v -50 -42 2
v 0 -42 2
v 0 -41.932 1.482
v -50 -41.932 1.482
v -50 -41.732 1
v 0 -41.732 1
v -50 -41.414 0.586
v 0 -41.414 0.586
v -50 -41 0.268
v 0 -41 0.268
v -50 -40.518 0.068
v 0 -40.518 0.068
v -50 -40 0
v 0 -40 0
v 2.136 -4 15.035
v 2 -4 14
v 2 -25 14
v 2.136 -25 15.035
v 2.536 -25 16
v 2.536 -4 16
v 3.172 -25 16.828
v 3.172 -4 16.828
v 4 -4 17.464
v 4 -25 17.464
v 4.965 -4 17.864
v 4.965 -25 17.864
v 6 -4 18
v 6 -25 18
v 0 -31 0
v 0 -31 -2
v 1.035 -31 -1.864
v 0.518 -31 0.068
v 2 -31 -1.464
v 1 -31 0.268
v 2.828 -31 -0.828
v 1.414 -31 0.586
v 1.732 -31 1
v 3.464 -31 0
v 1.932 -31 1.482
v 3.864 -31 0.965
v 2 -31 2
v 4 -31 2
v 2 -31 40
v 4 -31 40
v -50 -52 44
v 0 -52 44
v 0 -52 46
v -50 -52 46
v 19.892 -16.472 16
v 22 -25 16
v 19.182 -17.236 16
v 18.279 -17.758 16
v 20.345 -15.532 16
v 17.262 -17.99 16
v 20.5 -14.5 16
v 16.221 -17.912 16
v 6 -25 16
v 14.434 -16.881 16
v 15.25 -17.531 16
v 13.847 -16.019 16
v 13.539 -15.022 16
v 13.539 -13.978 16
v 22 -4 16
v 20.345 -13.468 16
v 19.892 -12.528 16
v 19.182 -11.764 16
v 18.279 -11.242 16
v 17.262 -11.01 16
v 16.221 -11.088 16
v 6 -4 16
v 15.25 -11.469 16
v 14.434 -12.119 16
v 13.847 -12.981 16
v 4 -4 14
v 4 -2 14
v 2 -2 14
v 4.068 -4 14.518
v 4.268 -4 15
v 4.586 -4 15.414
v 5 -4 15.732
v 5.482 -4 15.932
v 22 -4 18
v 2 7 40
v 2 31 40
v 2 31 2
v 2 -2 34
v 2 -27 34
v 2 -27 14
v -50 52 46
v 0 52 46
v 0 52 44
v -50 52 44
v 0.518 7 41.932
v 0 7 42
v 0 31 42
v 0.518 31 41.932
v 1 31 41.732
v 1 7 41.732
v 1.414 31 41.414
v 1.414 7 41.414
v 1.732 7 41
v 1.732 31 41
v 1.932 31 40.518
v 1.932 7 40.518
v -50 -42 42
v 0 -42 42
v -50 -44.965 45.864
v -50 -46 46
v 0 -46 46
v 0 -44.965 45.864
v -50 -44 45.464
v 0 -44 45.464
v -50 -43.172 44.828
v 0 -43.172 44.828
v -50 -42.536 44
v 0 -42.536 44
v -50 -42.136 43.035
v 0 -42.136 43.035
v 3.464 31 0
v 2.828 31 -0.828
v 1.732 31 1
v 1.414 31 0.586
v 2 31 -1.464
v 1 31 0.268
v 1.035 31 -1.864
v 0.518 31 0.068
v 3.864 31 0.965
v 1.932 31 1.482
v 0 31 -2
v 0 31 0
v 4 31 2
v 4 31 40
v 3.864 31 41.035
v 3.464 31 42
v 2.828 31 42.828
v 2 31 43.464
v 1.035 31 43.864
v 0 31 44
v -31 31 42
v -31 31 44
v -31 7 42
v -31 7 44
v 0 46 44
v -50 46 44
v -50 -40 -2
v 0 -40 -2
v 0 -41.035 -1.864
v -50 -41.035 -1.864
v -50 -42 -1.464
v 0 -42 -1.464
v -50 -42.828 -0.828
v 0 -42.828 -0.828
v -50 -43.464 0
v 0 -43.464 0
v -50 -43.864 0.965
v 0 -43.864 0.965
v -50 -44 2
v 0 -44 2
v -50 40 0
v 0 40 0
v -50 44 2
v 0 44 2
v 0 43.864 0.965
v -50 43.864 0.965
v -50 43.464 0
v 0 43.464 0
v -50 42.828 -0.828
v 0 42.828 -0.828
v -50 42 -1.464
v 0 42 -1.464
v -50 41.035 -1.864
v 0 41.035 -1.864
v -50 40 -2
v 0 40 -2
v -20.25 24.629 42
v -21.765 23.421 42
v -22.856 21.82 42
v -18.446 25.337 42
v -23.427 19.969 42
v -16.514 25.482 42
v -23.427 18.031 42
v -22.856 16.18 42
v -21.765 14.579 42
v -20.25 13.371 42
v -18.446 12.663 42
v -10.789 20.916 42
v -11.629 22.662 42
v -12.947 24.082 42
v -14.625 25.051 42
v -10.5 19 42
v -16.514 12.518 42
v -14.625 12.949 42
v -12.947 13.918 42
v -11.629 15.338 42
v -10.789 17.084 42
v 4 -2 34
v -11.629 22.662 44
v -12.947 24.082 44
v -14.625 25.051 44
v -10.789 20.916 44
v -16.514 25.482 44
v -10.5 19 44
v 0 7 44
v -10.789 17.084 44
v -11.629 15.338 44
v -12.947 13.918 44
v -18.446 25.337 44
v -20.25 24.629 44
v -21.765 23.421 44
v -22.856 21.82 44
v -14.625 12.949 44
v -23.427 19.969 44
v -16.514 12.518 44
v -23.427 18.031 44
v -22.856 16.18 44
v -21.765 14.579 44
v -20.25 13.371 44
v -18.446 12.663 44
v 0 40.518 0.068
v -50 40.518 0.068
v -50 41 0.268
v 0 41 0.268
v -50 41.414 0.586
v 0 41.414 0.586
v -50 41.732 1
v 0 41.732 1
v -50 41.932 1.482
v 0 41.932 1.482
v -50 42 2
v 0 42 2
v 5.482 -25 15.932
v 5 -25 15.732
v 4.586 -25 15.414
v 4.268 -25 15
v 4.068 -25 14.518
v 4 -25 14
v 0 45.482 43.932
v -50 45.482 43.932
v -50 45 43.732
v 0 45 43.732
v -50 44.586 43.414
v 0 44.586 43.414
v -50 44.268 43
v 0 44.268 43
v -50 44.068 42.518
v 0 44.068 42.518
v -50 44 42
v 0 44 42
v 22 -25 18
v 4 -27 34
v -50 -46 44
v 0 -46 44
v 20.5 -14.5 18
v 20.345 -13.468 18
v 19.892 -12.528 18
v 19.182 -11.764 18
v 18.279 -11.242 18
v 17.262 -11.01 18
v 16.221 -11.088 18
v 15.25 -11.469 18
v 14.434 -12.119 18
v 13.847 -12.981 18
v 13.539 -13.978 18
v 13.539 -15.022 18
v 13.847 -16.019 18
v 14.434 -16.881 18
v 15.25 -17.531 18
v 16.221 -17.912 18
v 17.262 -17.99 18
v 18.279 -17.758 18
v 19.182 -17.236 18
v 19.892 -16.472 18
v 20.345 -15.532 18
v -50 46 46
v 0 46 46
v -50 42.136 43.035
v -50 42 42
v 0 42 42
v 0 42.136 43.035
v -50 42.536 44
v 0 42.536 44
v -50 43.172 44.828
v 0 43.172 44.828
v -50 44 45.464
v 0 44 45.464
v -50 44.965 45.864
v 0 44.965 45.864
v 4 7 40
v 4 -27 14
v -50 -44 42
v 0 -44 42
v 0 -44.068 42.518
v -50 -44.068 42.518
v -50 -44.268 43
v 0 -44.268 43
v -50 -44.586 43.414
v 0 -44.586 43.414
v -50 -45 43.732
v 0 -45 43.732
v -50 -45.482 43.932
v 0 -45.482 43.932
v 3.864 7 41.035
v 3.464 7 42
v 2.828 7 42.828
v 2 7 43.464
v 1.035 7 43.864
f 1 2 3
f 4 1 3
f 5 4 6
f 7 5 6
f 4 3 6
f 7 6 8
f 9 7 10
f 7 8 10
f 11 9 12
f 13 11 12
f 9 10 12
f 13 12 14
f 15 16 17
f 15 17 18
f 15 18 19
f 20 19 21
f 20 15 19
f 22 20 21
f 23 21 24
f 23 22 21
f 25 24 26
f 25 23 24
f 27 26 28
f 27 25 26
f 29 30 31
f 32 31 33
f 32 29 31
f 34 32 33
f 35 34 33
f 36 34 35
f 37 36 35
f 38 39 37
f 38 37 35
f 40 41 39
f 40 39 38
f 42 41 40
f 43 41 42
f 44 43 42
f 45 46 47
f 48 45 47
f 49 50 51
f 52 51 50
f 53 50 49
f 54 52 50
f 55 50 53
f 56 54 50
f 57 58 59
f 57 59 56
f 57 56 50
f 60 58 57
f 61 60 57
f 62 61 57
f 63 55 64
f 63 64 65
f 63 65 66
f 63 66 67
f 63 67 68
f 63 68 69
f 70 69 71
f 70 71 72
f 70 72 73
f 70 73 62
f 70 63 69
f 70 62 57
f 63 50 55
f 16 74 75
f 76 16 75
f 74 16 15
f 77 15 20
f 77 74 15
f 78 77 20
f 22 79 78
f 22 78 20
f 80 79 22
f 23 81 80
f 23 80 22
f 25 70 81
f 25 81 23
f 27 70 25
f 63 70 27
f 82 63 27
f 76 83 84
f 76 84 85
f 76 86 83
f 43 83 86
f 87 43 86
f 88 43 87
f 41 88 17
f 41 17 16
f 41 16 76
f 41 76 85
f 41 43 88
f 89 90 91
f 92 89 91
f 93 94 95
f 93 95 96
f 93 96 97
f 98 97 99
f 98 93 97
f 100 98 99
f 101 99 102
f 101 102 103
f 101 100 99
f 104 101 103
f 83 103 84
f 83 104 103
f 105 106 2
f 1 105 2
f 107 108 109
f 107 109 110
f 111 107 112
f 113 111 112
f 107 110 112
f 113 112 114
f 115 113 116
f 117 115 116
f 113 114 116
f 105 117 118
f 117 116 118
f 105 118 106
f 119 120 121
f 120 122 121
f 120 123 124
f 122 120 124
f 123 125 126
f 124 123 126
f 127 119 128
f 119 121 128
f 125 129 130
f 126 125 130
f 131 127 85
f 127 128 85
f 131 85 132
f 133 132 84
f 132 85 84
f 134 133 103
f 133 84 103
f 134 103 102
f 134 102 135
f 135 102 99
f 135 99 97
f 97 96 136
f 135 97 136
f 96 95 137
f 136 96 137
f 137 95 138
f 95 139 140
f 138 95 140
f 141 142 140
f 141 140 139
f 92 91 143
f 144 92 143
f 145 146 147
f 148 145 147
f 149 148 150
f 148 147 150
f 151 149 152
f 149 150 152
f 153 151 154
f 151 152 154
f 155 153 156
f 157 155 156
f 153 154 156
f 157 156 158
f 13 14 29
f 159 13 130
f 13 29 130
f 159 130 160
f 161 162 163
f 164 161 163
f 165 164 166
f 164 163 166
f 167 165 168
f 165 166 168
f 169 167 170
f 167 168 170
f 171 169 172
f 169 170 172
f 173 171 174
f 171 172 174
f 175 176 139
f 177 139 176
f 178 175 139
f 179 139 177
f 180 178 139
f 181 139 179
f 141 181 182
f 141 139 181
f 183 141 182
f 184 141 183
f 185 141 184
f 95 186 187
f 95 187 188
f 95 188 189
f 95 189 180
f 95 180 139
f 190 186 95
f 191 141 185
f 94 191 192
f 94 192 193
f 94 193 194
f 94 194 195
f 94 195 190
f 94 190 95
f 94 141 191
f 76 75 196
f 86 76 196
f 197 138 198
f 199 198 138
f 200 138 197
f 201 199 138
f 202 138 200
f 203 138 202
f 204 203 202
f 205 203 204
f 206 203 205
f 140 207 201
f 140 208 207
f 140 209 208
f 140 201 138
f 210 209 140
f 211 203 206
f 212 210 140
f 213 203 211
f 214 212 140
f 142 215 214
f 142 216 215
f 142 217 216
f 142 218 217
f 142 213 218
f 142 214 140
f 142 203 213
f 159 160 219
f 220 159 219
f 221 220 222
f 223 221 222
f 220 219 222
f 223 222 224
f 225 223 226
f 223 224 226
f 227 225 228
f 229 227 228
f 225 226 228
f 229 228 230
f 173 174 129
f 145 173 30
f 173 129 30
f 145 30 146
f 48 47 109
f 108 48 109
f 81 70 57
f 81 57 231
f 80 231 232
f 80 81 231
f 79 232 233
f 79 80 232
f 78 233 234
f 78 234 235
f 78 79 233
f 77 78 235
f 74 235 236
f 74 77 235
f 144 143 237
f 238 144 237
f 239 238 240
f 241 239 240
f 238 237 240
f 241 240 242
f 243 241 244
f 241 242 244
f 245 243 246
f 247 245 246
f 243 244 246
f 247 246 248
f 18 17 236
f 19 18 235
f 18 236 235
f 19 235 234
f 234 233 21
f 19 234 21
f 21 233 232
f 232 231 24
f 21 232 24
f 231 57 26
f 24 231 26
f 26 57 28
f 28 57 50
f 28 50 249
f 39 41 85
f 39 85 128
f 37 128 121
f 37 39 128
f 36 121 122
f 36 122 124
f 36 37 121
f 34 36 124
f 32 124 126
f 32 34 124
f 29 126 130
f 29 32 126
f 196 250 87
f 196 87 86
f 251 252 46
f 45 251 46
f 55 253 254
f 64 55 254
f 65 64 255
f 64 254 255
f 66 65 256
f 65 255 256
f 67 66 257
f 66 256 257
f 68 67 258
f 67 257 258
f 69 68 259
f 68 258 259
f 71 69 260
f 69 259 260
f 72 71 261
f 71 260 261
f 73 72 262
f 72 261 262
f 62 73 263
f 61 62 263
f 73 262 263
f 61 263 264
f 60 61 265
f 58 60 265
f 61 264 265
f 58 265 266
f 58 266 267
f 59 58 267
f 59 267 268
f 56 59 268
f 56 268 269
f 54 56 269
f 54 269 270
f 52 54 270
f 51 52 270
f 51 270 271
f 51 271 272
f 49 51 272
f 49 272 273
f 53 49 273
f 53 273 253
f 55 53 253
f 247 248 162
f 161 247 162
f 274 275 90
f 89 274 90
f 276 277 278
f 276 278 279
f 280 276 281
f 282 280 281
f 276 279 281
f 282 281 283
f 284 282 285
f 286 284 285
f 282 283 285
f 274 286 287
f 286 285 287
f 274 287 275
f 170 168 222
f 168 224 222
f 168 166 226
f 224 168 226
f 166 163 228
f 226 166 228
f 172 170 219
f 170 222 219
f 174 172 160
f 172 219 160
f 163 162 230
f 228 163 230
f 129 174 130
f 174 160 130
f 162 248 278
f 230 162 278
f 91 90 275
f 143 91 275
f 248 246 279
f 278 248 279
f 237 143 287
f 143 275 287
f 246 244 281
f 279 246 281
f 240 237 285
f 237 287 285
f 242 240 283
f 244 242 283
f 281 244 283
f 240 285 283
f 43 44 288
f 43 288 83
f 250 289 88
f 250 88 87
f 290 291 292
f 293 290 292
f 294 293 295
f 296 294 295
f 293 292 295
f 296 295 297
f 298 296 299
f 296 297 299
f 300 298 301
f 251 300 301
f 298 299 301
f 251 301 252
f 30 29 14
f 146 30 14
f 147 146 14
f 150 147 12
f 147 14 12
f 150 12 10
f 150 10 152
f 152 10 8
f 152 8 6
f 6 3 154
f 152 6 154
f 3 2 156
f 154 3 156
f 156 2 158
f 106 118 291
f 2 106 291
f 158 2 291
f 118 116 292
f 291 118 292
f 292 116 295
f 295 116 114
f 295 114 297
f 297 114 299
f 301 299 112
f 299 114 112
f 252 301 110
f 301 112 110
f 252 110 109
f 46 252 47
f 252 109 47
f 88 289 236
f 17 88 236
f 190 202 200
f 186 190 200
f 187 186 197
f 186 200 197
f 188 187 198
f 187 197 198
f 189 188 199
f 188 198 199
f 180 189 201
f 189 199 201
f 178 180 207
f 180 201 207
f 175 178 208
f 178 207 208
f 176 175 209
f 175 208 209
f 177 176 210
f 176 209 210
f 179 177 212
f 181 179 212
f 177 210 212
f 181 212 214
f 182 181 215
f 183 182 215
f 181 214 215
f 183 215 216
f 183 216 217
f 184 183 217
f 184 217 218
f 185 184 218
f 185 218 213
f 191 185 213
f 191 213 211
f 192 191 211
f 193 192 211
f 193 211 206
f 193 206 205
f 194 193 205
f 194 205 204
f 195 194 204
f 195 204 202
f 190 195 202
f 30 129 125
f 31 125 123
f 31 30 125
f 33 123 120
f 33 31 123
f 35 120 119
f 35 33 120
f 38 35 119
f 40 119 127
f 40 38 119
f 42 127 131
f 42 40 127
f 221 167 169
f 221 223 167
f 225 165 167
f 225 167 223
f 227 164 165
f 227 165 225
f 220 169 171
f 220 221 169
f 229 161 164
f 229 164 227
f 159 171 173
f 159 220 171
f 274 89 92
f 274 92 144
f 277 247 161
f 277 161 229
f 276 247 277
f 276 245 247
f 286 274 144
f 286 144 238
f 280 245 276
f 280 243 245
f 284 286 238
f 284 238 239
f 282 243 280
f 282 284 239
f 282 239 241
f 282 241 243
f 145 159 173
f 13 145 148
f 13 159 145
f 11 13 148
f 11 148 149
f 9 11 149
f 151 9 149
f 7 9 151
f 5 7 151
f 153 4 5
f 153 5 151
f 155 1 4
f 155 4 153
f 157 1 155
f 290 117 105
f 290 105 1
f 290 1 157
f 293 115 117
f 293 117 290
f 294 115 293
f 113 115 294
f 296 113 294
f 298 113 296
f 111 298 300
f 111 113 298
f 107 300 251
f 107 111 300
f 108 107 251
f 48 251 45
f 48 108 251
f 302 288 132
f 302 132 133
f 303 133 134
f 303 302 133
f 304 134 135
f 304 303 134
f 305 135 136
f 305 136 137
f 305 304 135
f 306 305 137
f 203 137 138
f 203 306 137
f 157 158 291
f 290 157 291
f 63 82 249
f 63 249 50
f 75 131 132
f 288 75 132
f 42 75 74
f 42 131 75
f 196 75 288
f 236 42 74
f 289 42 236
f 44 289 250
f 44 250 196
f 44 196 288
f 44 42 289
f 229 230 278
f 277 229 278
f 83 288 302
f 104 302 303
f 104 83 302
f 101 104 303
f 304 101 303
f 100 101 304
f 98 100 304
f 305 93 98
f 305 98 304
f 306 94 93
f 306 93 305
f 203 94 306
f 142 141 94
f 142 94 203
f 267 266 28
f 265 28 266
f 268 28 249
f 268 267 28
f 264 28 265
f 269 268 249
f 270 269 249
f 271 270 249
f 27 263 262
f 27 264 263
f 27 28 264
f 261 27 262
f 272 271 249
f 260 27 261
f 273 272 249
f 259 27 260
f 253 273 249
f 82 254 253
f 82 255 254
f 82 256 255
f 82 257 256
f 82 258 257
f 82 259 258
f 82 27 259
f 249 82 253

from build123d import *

# Parameters (mm, degrees)
BASE_FLANGE1_DEPTH = 50
EDGE_FLANGE1_DEPTH = 62
SKETCH9_W          = 25
SKETCH9_H          = 20
CUT_EXTRUDE1_DEPTH = 10
EDGE_FLANGE2_DEPTH = 21
SKETCH13_R         = 3.5
CUT_EXTRUDE2_DEPTH = 10
EDGE_FLANGE3_DEPTH = 24
SKETCH17_R         = 6.5
CUT_EXTRUDE3_DEPTH = 10


# Sheet-metal steps are written as plain solids
with BuildPart() as part:
    # Sketch1 → Base-Flange1 (new body)
    with BuildSketch(Plane.YZ):
        with BuildLine():
            Line((-52, 46), (-46, 46))
            ThreePointArc((-46, 46), (-43.171572875, 44.828427125), (-42, 42))
            Line((-42, 42), (-42, 2))
            ThreePointArc((-42, 2), (-41.414213562, 0.585786438), (-40, 0))
            Line((-40, 0), (40, 0))
            ThreePointArc((40, 0), (41.414213562, 0.585786438), (42, 2))
            Line((42, 2), (42, 42))
            ThreePointArc((42, 42), (43.171572875, 44.828427125), (46, 46))
            Line((46, 46), (52, 46))
            Line((52, 46), (52, 44))
            Line((52, 44), (46, 44))
            ThreePointArc((46, 44), (44.585786438, 43.414213562), (44, 42))
            Line((44, 42), (44, 2))
            ThreePointArc((44, 2), (42.828427125, -0.828427125), (40, -2))
            Line((40, -2), (-40, -2))
            ThreePointArc((-40, -2), (-42.828427125, -0.828427125), (-44, 2))
            Line((-44, 2), (-44, 42))
            ThreePointArc((-44, 42), (-44.585786438, 43.414213562), (-46, 44))
            Line((-46, 44), (-52, 44))
            Line((-52, 44), (-52, 46))
        make_face()
    extrude(amount=-BASE_FLANGE1_DEPTH)

    # Edge-Flange1 section (across the edge) → Edge-Flange1 (add)
    with BuildSketch(Plane(origin=(2, -31, 0), x_dir=(-1, 0, 0), z_dir=(0, 1, 0))):
        with BuildLine():
            Line((-2, 2), (-2, 40))
            Line((-2, 40), (0, 40))
            Line((0, 40), (0, 2))
            ThreePointArc((0, 2), (0.585786438, 0.585786438), (2, 0))
            Line((2, 0), (2, -2))
            ThreePointArc((2, -2), (-0.828427125, -0.828427125), (-2, 2))
        make_face()
    extrude(amount=EDGE_FLANGE1_DEPTH)

    # Sketch9 → Cut-Extrude1 (cut)
    with BuildSketch(Plane.YZ.offset(4)):
        with Locations((-14.5, 24)):
            Rectangle(SKETCH9_W, SKETCH9_H)
    extrude(amount=-CUT_EXTRUDE1_DEPTH, mode=Mode.SUBTRACT)

    # Edge-Flange2 section (across the edge) → Edge-Flange2 (add)
    with BuildSketch(Plane(origin=(4, -4, 16), x_dir=(0, 0, -1), z_dir=(0, -1, 0))):
        with BuildLine():
            Line((-2, 2), (-2, 18))
            Line((-2, 18), (0, 18))
            Line((0, 18), (0, 2))
            ThreePointArc((0, 2), (0.585786438, 0.585786438), (2, 0))
            Line((2, 0), (2, -2))
            ThreePointArc((2, -2), (-0.828427125, -0.828427125), (-2, 2))
        make_face()
    extrude(amount=EDGE_FLANGE2_DEPTH)

    # Sketch13 → Cut-Extrude2 (cut)
    with BuildSketch(Plane.XY.offset(18)):
        with Locations((17, -14.5)):
            Circle(SKETCH13_R)
    extrude(amount=-CUT_EXTRUDE2_DEPTH, mode=Mode.SUBTRACT)

    # Edge-Flange3 section (across the edge) → Edge-Flange3 (add)
    with BuildSketch(Plane(origin=(2, 7, 42), x_dir=(0, 0, -1), z_dir=(0, 1, 0))):
        with BuildLine():
            Line((-2, 2), (-2, 33))
            Line((-2, 33), (0, 33))
            Line((0, 33), (0, 2))
            ThreePointArc((0, 2), (0.585786438, 0.585786438), (2, 0))
            Line((2, 0), (2, -2))
            ThreePointArc((2, -2), (-0.828427125, -0.828427125), (-2, 2))
        make_face()
    extrude(amount=EDGE_FLANGE3_DEPTH)

    # Sketch17 → Cut-Extrude3 (cut)
    with BuildSketch(Plane.XY.offset(44)):
        with Locations((-17, 19)):
            Circle(SKETCH17_R)
    extrude(amount=-CUT_EXTRUDE3_DEPTH, mode=Mode.SUBTRACT)


solid = part.part
